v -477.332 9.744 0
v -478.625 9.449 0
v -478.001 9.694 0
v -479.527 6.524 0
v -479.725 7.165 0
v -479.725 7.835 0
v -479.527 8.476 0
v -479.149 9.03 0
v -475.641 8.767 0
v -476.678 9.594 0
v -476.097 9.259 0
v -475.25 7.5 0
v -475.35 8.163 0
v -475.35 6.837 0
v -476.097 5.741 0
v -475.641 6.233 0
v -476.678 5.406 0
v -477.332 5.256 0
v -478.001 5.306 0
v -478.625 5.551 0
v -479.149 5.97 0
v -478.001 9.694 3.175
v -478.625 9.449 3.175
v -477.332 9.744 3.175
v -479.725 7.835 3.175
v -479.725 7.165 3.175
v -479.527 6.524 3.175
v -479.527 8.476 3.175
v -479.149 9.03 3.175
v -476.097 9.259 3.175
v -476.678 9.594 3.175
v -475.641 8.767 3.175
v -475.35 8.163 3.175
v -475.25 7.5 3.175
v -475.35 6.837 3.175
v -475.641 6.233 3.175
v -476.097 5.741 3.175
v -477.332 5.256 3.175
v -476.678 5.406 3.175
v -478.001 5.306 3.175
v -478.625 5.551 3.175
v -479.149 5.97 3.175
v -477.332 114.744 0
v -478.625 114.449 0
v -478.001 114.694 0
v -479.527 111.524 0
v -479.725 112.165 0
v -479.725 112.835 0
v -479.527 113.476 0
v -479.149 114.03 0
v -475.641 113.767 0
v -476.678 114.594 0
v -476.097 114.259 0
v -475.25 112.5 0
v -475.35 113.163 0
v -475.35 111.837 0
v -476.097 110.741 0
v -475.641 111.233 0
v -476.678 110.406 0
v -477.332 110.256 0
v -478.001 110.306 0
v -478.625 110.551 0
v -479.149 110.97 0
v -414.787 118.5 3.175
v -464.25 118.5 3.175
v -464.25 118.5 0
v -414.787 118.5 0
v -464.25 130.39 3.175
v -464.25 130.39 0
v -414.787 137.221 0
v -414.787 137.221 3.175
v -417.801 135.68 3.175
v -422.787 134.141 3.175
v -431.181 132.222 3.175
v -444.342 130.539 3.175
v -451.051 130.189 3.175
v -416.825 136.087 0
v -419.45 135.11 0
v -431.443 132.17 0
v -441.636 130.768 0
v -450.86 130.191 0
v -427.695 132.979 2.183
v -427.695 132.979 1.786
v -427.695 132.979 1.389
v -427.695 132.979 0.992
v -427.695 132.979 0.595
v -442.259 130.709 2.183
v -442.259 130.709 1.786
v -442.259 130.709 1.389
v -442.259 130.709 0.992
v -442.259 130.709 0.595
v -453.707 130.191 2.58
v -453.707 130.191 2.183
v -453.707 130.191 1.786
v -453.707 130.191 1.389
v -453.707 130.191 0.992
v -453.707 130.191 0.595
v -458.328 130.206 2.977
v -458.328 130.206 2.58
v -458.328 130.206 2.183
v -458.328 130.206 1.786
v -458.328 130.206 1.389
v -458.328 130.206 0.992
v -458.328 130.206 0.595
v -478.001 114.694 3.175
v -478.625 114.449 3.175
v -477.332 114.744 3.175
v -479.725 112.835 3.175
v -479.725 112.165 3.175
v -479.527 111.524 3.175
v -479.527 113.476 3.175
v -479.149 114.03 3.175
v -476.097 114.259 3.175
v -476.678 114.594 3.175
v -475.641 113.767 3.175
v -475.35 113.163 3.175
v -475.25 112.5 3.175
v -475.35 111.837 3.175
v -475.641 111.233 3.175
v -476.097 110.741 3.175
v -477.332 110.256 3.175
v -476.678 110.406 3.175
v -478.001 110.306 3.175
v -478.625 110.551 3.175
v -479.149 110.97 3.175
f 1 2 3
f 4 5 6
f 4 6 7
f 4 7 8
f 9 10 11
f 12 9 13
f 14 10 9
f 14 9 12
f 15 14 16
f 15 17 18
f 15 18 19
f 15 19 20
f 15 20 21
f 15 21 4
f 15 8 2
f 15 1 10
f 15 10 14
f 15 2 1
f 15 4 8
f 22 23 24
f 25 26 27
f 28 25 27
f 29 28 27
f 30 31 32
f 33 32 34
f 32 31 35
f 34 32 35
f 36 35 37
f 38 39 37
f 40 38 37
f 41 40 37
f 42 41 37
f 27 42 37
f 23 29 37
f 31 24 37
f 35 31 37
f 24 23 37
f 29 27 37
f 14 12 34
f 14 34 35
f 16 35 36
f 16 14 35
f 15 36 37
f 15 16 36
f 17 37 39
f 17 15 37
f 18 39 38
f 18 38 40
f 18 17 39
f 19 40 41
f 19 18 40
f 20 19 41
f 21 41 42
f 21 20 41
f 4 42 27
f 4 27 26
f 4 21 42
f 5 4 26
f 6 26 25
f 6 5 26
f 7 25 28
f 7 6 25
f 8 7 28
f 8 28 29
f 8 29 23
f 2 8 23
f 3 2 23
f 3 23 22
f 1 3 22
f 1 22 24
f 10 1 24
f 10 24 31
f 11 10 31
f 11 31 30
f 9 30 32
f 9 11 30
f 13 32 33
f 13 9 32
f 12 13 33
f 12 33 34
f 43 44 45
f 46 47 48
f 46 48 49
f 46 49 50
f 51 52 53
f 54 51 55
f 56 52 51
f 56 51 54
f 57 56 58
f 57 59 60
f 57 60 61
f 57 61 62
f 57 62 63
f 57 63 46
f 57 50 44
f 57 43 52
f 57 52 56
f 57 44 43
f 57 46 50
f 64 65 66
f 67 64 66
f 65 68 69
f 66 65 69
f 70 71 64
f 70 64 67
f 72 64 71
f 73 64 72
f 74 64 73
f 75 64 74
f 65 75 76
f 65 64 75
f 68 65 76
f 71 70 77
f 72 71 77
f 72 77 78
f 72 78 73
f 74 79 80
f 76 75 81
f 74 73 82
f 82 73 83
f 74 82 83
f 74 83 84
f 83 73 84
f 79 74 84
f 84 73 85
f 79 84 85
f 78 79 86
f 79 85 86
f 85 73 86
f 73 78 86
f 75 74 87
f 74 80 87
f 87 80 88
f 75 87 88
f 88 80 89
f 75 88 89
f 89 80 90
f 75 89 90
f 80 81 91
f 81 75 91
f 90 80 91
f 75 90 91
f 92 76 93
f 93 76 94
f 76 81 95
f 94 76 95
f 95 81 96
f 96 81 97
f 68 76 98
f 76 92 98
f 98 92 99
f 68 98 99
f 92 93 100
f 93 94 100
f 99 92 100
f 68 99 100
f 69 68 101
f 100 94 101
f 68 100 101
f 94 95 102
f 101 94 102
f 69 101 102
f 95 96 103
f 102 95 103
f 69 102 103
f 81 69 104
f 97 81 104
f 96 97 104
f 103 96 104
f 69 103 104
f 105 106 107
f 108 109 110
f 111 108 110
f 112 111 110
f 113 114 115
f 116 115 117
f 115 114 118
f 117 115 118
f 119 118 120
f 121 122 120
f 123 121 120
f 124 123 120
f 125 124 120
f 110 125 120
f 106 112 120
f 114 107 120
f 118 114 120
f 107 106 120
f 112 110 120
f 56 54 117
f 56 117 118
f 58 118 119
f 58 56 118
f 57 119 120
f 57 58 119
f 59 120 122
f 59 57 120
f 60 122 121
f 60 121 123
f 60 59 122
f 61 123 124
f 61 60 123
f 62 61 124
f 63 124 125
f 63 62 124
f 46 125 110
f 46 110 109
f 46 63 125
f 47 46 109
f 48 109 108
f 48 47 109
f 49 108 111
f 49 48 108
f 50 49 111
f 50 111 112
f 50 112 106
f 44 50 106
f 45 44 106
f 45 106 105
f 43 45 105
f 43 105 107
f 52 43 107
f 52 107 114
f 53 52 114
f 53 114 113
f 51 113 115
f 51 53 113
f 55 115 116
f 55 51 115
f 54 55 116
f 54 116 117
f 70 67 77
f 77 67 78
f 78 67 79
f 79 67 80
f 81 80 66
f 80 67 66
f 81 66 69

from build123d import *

# Parameters (mm, degrees)
F_3DSKETCH1_R         = 2.25
BOSS_EXTRUDE1_DEPTH   = 3.175
BOSS_EXTRUDE1_2_DEPTH = 3.175
SKETCH1_W             = 3.175
SKETCH1_H             = 22.959761953
BOSS_EXTRUDE2_DEPTH   = 49.462687847
CUT_EXTRUDE1_DEPTH    = 5.08


with BuildPart() as part:
    # 3DSketch1 → Boss-Extrude1 (new body)
    with BuildSketch(Plane(origin=(-464.25, 116.5, 0), x_dir=(-0.27427932364426477, -0.9616500676551969, 0), z_dir=(0, 0, -1))):
        with Locations(Location((108.454058413, -17.154582881, 0), (0, 0, 254.080928829))):
            Circle(F_3DSKETCH1_R)
    extrude(amount=-BOSS_EXTRUDE1_DEPTH)


with BuildPart() as body_2:
    # 3DSketch1 → Boss-Extrude1 2 (new body)
    with BuildSketch(Plane(origin=(-464.25, 116.5, 0), x_dir=(-0.27427932364426477, -0.9616500676551969, 0), z_dir=(0, 0, -1))):
        with Locations(Location((7.480801309, 11.644746102, 0), (0, 0, 254.080928829))):
            Circle(F_3DSKETCH1_R)
    extrude(amount=-BOSS_EXTRUDE1_2_DEPTH)


with BuildPart() as body_3:
    # Sketch1 → Boss-Extrude2 (new body)
    with BuildSketch(Plane(origin=(-464.25, 0, 0), x_dir=(0, 0, -1), z_dir=(1, 0, 0))):
        with Locations((-1.5875, 129.979880976)):
            Rectangle(SKETCH1_W, SKETCH1_H)
    extrude(amount=BOSS_EXTRUDE2_DEPTH)

    # Sketch2 → Cut-Extrude1 (cut)
    with BuildSketch(Plane(origin=(0, 0, 0), x_dir=(-1, 0, 0), z_dir=(0, 0, -1))):
        with BuildLine():
            Line((490, 141.459761953), (414.787312153, 141.459761953))
            Line((414.787312153, 141.459761953), (414.787312153, 137.220888891))
            add(Edge.make_bspline(
                [(414.787312153, 137.220888891), (416.803355128, 135.83988374), (420.148230363, 134.896102648), (424.514399841, 133.641199566), (427.753187268, 132.983461779), (431.906399587, 132.015072768), (436.775926001, 131.291578005), (441.469376717, 130.7599234), (445.244870822, 130.459970277), (448.120397534, 130.350176556), (450.468416009, 130.168574827), (452.276227088, 130.200559294), (453.625826876, 130.185456971), (455.28575693, 130.205272665), (456.826171615, 130.20552598), (458.293104177, 130.205053692), (468.73850206, 130.269698355), (478.824094069, 131.831260872), (488.015089833, 135.328425641)],
                knots=[0, 0, 0, 0, 0.097259794, 0.137717888, 0.182659819, 0.22981785, 0.308935289, 0.380085487, 0.419482255, 0.460955678, 0.495635111, 0.513941351, 0.533517447, 0.549827507, 0.580590235, 0.595366858, 0.608725717, 1, 1, 1, 1], degree=3))
            add(Edge.make_bspline(
                [(488.015089833, 135.328425641), (490.915002323, 134.351803739), (493.963481884, 133.638822528), (497.05, 133.883148618)],
                knots=[0, 0, 0, 0, 1, 1, 1, 1], degree=3))
            Line((497.05, 133.883148618), (497.05, 141.459761953))
            Line((497.05, 141.459761953), (490, 141.459761953))
        make_face()
    extrude(amount=-CUT_EXTRUDE1_DEPTH, mode=Mode.SUBTRACT)


solid = Compound([part.part, body_2.part, body_3.part])
